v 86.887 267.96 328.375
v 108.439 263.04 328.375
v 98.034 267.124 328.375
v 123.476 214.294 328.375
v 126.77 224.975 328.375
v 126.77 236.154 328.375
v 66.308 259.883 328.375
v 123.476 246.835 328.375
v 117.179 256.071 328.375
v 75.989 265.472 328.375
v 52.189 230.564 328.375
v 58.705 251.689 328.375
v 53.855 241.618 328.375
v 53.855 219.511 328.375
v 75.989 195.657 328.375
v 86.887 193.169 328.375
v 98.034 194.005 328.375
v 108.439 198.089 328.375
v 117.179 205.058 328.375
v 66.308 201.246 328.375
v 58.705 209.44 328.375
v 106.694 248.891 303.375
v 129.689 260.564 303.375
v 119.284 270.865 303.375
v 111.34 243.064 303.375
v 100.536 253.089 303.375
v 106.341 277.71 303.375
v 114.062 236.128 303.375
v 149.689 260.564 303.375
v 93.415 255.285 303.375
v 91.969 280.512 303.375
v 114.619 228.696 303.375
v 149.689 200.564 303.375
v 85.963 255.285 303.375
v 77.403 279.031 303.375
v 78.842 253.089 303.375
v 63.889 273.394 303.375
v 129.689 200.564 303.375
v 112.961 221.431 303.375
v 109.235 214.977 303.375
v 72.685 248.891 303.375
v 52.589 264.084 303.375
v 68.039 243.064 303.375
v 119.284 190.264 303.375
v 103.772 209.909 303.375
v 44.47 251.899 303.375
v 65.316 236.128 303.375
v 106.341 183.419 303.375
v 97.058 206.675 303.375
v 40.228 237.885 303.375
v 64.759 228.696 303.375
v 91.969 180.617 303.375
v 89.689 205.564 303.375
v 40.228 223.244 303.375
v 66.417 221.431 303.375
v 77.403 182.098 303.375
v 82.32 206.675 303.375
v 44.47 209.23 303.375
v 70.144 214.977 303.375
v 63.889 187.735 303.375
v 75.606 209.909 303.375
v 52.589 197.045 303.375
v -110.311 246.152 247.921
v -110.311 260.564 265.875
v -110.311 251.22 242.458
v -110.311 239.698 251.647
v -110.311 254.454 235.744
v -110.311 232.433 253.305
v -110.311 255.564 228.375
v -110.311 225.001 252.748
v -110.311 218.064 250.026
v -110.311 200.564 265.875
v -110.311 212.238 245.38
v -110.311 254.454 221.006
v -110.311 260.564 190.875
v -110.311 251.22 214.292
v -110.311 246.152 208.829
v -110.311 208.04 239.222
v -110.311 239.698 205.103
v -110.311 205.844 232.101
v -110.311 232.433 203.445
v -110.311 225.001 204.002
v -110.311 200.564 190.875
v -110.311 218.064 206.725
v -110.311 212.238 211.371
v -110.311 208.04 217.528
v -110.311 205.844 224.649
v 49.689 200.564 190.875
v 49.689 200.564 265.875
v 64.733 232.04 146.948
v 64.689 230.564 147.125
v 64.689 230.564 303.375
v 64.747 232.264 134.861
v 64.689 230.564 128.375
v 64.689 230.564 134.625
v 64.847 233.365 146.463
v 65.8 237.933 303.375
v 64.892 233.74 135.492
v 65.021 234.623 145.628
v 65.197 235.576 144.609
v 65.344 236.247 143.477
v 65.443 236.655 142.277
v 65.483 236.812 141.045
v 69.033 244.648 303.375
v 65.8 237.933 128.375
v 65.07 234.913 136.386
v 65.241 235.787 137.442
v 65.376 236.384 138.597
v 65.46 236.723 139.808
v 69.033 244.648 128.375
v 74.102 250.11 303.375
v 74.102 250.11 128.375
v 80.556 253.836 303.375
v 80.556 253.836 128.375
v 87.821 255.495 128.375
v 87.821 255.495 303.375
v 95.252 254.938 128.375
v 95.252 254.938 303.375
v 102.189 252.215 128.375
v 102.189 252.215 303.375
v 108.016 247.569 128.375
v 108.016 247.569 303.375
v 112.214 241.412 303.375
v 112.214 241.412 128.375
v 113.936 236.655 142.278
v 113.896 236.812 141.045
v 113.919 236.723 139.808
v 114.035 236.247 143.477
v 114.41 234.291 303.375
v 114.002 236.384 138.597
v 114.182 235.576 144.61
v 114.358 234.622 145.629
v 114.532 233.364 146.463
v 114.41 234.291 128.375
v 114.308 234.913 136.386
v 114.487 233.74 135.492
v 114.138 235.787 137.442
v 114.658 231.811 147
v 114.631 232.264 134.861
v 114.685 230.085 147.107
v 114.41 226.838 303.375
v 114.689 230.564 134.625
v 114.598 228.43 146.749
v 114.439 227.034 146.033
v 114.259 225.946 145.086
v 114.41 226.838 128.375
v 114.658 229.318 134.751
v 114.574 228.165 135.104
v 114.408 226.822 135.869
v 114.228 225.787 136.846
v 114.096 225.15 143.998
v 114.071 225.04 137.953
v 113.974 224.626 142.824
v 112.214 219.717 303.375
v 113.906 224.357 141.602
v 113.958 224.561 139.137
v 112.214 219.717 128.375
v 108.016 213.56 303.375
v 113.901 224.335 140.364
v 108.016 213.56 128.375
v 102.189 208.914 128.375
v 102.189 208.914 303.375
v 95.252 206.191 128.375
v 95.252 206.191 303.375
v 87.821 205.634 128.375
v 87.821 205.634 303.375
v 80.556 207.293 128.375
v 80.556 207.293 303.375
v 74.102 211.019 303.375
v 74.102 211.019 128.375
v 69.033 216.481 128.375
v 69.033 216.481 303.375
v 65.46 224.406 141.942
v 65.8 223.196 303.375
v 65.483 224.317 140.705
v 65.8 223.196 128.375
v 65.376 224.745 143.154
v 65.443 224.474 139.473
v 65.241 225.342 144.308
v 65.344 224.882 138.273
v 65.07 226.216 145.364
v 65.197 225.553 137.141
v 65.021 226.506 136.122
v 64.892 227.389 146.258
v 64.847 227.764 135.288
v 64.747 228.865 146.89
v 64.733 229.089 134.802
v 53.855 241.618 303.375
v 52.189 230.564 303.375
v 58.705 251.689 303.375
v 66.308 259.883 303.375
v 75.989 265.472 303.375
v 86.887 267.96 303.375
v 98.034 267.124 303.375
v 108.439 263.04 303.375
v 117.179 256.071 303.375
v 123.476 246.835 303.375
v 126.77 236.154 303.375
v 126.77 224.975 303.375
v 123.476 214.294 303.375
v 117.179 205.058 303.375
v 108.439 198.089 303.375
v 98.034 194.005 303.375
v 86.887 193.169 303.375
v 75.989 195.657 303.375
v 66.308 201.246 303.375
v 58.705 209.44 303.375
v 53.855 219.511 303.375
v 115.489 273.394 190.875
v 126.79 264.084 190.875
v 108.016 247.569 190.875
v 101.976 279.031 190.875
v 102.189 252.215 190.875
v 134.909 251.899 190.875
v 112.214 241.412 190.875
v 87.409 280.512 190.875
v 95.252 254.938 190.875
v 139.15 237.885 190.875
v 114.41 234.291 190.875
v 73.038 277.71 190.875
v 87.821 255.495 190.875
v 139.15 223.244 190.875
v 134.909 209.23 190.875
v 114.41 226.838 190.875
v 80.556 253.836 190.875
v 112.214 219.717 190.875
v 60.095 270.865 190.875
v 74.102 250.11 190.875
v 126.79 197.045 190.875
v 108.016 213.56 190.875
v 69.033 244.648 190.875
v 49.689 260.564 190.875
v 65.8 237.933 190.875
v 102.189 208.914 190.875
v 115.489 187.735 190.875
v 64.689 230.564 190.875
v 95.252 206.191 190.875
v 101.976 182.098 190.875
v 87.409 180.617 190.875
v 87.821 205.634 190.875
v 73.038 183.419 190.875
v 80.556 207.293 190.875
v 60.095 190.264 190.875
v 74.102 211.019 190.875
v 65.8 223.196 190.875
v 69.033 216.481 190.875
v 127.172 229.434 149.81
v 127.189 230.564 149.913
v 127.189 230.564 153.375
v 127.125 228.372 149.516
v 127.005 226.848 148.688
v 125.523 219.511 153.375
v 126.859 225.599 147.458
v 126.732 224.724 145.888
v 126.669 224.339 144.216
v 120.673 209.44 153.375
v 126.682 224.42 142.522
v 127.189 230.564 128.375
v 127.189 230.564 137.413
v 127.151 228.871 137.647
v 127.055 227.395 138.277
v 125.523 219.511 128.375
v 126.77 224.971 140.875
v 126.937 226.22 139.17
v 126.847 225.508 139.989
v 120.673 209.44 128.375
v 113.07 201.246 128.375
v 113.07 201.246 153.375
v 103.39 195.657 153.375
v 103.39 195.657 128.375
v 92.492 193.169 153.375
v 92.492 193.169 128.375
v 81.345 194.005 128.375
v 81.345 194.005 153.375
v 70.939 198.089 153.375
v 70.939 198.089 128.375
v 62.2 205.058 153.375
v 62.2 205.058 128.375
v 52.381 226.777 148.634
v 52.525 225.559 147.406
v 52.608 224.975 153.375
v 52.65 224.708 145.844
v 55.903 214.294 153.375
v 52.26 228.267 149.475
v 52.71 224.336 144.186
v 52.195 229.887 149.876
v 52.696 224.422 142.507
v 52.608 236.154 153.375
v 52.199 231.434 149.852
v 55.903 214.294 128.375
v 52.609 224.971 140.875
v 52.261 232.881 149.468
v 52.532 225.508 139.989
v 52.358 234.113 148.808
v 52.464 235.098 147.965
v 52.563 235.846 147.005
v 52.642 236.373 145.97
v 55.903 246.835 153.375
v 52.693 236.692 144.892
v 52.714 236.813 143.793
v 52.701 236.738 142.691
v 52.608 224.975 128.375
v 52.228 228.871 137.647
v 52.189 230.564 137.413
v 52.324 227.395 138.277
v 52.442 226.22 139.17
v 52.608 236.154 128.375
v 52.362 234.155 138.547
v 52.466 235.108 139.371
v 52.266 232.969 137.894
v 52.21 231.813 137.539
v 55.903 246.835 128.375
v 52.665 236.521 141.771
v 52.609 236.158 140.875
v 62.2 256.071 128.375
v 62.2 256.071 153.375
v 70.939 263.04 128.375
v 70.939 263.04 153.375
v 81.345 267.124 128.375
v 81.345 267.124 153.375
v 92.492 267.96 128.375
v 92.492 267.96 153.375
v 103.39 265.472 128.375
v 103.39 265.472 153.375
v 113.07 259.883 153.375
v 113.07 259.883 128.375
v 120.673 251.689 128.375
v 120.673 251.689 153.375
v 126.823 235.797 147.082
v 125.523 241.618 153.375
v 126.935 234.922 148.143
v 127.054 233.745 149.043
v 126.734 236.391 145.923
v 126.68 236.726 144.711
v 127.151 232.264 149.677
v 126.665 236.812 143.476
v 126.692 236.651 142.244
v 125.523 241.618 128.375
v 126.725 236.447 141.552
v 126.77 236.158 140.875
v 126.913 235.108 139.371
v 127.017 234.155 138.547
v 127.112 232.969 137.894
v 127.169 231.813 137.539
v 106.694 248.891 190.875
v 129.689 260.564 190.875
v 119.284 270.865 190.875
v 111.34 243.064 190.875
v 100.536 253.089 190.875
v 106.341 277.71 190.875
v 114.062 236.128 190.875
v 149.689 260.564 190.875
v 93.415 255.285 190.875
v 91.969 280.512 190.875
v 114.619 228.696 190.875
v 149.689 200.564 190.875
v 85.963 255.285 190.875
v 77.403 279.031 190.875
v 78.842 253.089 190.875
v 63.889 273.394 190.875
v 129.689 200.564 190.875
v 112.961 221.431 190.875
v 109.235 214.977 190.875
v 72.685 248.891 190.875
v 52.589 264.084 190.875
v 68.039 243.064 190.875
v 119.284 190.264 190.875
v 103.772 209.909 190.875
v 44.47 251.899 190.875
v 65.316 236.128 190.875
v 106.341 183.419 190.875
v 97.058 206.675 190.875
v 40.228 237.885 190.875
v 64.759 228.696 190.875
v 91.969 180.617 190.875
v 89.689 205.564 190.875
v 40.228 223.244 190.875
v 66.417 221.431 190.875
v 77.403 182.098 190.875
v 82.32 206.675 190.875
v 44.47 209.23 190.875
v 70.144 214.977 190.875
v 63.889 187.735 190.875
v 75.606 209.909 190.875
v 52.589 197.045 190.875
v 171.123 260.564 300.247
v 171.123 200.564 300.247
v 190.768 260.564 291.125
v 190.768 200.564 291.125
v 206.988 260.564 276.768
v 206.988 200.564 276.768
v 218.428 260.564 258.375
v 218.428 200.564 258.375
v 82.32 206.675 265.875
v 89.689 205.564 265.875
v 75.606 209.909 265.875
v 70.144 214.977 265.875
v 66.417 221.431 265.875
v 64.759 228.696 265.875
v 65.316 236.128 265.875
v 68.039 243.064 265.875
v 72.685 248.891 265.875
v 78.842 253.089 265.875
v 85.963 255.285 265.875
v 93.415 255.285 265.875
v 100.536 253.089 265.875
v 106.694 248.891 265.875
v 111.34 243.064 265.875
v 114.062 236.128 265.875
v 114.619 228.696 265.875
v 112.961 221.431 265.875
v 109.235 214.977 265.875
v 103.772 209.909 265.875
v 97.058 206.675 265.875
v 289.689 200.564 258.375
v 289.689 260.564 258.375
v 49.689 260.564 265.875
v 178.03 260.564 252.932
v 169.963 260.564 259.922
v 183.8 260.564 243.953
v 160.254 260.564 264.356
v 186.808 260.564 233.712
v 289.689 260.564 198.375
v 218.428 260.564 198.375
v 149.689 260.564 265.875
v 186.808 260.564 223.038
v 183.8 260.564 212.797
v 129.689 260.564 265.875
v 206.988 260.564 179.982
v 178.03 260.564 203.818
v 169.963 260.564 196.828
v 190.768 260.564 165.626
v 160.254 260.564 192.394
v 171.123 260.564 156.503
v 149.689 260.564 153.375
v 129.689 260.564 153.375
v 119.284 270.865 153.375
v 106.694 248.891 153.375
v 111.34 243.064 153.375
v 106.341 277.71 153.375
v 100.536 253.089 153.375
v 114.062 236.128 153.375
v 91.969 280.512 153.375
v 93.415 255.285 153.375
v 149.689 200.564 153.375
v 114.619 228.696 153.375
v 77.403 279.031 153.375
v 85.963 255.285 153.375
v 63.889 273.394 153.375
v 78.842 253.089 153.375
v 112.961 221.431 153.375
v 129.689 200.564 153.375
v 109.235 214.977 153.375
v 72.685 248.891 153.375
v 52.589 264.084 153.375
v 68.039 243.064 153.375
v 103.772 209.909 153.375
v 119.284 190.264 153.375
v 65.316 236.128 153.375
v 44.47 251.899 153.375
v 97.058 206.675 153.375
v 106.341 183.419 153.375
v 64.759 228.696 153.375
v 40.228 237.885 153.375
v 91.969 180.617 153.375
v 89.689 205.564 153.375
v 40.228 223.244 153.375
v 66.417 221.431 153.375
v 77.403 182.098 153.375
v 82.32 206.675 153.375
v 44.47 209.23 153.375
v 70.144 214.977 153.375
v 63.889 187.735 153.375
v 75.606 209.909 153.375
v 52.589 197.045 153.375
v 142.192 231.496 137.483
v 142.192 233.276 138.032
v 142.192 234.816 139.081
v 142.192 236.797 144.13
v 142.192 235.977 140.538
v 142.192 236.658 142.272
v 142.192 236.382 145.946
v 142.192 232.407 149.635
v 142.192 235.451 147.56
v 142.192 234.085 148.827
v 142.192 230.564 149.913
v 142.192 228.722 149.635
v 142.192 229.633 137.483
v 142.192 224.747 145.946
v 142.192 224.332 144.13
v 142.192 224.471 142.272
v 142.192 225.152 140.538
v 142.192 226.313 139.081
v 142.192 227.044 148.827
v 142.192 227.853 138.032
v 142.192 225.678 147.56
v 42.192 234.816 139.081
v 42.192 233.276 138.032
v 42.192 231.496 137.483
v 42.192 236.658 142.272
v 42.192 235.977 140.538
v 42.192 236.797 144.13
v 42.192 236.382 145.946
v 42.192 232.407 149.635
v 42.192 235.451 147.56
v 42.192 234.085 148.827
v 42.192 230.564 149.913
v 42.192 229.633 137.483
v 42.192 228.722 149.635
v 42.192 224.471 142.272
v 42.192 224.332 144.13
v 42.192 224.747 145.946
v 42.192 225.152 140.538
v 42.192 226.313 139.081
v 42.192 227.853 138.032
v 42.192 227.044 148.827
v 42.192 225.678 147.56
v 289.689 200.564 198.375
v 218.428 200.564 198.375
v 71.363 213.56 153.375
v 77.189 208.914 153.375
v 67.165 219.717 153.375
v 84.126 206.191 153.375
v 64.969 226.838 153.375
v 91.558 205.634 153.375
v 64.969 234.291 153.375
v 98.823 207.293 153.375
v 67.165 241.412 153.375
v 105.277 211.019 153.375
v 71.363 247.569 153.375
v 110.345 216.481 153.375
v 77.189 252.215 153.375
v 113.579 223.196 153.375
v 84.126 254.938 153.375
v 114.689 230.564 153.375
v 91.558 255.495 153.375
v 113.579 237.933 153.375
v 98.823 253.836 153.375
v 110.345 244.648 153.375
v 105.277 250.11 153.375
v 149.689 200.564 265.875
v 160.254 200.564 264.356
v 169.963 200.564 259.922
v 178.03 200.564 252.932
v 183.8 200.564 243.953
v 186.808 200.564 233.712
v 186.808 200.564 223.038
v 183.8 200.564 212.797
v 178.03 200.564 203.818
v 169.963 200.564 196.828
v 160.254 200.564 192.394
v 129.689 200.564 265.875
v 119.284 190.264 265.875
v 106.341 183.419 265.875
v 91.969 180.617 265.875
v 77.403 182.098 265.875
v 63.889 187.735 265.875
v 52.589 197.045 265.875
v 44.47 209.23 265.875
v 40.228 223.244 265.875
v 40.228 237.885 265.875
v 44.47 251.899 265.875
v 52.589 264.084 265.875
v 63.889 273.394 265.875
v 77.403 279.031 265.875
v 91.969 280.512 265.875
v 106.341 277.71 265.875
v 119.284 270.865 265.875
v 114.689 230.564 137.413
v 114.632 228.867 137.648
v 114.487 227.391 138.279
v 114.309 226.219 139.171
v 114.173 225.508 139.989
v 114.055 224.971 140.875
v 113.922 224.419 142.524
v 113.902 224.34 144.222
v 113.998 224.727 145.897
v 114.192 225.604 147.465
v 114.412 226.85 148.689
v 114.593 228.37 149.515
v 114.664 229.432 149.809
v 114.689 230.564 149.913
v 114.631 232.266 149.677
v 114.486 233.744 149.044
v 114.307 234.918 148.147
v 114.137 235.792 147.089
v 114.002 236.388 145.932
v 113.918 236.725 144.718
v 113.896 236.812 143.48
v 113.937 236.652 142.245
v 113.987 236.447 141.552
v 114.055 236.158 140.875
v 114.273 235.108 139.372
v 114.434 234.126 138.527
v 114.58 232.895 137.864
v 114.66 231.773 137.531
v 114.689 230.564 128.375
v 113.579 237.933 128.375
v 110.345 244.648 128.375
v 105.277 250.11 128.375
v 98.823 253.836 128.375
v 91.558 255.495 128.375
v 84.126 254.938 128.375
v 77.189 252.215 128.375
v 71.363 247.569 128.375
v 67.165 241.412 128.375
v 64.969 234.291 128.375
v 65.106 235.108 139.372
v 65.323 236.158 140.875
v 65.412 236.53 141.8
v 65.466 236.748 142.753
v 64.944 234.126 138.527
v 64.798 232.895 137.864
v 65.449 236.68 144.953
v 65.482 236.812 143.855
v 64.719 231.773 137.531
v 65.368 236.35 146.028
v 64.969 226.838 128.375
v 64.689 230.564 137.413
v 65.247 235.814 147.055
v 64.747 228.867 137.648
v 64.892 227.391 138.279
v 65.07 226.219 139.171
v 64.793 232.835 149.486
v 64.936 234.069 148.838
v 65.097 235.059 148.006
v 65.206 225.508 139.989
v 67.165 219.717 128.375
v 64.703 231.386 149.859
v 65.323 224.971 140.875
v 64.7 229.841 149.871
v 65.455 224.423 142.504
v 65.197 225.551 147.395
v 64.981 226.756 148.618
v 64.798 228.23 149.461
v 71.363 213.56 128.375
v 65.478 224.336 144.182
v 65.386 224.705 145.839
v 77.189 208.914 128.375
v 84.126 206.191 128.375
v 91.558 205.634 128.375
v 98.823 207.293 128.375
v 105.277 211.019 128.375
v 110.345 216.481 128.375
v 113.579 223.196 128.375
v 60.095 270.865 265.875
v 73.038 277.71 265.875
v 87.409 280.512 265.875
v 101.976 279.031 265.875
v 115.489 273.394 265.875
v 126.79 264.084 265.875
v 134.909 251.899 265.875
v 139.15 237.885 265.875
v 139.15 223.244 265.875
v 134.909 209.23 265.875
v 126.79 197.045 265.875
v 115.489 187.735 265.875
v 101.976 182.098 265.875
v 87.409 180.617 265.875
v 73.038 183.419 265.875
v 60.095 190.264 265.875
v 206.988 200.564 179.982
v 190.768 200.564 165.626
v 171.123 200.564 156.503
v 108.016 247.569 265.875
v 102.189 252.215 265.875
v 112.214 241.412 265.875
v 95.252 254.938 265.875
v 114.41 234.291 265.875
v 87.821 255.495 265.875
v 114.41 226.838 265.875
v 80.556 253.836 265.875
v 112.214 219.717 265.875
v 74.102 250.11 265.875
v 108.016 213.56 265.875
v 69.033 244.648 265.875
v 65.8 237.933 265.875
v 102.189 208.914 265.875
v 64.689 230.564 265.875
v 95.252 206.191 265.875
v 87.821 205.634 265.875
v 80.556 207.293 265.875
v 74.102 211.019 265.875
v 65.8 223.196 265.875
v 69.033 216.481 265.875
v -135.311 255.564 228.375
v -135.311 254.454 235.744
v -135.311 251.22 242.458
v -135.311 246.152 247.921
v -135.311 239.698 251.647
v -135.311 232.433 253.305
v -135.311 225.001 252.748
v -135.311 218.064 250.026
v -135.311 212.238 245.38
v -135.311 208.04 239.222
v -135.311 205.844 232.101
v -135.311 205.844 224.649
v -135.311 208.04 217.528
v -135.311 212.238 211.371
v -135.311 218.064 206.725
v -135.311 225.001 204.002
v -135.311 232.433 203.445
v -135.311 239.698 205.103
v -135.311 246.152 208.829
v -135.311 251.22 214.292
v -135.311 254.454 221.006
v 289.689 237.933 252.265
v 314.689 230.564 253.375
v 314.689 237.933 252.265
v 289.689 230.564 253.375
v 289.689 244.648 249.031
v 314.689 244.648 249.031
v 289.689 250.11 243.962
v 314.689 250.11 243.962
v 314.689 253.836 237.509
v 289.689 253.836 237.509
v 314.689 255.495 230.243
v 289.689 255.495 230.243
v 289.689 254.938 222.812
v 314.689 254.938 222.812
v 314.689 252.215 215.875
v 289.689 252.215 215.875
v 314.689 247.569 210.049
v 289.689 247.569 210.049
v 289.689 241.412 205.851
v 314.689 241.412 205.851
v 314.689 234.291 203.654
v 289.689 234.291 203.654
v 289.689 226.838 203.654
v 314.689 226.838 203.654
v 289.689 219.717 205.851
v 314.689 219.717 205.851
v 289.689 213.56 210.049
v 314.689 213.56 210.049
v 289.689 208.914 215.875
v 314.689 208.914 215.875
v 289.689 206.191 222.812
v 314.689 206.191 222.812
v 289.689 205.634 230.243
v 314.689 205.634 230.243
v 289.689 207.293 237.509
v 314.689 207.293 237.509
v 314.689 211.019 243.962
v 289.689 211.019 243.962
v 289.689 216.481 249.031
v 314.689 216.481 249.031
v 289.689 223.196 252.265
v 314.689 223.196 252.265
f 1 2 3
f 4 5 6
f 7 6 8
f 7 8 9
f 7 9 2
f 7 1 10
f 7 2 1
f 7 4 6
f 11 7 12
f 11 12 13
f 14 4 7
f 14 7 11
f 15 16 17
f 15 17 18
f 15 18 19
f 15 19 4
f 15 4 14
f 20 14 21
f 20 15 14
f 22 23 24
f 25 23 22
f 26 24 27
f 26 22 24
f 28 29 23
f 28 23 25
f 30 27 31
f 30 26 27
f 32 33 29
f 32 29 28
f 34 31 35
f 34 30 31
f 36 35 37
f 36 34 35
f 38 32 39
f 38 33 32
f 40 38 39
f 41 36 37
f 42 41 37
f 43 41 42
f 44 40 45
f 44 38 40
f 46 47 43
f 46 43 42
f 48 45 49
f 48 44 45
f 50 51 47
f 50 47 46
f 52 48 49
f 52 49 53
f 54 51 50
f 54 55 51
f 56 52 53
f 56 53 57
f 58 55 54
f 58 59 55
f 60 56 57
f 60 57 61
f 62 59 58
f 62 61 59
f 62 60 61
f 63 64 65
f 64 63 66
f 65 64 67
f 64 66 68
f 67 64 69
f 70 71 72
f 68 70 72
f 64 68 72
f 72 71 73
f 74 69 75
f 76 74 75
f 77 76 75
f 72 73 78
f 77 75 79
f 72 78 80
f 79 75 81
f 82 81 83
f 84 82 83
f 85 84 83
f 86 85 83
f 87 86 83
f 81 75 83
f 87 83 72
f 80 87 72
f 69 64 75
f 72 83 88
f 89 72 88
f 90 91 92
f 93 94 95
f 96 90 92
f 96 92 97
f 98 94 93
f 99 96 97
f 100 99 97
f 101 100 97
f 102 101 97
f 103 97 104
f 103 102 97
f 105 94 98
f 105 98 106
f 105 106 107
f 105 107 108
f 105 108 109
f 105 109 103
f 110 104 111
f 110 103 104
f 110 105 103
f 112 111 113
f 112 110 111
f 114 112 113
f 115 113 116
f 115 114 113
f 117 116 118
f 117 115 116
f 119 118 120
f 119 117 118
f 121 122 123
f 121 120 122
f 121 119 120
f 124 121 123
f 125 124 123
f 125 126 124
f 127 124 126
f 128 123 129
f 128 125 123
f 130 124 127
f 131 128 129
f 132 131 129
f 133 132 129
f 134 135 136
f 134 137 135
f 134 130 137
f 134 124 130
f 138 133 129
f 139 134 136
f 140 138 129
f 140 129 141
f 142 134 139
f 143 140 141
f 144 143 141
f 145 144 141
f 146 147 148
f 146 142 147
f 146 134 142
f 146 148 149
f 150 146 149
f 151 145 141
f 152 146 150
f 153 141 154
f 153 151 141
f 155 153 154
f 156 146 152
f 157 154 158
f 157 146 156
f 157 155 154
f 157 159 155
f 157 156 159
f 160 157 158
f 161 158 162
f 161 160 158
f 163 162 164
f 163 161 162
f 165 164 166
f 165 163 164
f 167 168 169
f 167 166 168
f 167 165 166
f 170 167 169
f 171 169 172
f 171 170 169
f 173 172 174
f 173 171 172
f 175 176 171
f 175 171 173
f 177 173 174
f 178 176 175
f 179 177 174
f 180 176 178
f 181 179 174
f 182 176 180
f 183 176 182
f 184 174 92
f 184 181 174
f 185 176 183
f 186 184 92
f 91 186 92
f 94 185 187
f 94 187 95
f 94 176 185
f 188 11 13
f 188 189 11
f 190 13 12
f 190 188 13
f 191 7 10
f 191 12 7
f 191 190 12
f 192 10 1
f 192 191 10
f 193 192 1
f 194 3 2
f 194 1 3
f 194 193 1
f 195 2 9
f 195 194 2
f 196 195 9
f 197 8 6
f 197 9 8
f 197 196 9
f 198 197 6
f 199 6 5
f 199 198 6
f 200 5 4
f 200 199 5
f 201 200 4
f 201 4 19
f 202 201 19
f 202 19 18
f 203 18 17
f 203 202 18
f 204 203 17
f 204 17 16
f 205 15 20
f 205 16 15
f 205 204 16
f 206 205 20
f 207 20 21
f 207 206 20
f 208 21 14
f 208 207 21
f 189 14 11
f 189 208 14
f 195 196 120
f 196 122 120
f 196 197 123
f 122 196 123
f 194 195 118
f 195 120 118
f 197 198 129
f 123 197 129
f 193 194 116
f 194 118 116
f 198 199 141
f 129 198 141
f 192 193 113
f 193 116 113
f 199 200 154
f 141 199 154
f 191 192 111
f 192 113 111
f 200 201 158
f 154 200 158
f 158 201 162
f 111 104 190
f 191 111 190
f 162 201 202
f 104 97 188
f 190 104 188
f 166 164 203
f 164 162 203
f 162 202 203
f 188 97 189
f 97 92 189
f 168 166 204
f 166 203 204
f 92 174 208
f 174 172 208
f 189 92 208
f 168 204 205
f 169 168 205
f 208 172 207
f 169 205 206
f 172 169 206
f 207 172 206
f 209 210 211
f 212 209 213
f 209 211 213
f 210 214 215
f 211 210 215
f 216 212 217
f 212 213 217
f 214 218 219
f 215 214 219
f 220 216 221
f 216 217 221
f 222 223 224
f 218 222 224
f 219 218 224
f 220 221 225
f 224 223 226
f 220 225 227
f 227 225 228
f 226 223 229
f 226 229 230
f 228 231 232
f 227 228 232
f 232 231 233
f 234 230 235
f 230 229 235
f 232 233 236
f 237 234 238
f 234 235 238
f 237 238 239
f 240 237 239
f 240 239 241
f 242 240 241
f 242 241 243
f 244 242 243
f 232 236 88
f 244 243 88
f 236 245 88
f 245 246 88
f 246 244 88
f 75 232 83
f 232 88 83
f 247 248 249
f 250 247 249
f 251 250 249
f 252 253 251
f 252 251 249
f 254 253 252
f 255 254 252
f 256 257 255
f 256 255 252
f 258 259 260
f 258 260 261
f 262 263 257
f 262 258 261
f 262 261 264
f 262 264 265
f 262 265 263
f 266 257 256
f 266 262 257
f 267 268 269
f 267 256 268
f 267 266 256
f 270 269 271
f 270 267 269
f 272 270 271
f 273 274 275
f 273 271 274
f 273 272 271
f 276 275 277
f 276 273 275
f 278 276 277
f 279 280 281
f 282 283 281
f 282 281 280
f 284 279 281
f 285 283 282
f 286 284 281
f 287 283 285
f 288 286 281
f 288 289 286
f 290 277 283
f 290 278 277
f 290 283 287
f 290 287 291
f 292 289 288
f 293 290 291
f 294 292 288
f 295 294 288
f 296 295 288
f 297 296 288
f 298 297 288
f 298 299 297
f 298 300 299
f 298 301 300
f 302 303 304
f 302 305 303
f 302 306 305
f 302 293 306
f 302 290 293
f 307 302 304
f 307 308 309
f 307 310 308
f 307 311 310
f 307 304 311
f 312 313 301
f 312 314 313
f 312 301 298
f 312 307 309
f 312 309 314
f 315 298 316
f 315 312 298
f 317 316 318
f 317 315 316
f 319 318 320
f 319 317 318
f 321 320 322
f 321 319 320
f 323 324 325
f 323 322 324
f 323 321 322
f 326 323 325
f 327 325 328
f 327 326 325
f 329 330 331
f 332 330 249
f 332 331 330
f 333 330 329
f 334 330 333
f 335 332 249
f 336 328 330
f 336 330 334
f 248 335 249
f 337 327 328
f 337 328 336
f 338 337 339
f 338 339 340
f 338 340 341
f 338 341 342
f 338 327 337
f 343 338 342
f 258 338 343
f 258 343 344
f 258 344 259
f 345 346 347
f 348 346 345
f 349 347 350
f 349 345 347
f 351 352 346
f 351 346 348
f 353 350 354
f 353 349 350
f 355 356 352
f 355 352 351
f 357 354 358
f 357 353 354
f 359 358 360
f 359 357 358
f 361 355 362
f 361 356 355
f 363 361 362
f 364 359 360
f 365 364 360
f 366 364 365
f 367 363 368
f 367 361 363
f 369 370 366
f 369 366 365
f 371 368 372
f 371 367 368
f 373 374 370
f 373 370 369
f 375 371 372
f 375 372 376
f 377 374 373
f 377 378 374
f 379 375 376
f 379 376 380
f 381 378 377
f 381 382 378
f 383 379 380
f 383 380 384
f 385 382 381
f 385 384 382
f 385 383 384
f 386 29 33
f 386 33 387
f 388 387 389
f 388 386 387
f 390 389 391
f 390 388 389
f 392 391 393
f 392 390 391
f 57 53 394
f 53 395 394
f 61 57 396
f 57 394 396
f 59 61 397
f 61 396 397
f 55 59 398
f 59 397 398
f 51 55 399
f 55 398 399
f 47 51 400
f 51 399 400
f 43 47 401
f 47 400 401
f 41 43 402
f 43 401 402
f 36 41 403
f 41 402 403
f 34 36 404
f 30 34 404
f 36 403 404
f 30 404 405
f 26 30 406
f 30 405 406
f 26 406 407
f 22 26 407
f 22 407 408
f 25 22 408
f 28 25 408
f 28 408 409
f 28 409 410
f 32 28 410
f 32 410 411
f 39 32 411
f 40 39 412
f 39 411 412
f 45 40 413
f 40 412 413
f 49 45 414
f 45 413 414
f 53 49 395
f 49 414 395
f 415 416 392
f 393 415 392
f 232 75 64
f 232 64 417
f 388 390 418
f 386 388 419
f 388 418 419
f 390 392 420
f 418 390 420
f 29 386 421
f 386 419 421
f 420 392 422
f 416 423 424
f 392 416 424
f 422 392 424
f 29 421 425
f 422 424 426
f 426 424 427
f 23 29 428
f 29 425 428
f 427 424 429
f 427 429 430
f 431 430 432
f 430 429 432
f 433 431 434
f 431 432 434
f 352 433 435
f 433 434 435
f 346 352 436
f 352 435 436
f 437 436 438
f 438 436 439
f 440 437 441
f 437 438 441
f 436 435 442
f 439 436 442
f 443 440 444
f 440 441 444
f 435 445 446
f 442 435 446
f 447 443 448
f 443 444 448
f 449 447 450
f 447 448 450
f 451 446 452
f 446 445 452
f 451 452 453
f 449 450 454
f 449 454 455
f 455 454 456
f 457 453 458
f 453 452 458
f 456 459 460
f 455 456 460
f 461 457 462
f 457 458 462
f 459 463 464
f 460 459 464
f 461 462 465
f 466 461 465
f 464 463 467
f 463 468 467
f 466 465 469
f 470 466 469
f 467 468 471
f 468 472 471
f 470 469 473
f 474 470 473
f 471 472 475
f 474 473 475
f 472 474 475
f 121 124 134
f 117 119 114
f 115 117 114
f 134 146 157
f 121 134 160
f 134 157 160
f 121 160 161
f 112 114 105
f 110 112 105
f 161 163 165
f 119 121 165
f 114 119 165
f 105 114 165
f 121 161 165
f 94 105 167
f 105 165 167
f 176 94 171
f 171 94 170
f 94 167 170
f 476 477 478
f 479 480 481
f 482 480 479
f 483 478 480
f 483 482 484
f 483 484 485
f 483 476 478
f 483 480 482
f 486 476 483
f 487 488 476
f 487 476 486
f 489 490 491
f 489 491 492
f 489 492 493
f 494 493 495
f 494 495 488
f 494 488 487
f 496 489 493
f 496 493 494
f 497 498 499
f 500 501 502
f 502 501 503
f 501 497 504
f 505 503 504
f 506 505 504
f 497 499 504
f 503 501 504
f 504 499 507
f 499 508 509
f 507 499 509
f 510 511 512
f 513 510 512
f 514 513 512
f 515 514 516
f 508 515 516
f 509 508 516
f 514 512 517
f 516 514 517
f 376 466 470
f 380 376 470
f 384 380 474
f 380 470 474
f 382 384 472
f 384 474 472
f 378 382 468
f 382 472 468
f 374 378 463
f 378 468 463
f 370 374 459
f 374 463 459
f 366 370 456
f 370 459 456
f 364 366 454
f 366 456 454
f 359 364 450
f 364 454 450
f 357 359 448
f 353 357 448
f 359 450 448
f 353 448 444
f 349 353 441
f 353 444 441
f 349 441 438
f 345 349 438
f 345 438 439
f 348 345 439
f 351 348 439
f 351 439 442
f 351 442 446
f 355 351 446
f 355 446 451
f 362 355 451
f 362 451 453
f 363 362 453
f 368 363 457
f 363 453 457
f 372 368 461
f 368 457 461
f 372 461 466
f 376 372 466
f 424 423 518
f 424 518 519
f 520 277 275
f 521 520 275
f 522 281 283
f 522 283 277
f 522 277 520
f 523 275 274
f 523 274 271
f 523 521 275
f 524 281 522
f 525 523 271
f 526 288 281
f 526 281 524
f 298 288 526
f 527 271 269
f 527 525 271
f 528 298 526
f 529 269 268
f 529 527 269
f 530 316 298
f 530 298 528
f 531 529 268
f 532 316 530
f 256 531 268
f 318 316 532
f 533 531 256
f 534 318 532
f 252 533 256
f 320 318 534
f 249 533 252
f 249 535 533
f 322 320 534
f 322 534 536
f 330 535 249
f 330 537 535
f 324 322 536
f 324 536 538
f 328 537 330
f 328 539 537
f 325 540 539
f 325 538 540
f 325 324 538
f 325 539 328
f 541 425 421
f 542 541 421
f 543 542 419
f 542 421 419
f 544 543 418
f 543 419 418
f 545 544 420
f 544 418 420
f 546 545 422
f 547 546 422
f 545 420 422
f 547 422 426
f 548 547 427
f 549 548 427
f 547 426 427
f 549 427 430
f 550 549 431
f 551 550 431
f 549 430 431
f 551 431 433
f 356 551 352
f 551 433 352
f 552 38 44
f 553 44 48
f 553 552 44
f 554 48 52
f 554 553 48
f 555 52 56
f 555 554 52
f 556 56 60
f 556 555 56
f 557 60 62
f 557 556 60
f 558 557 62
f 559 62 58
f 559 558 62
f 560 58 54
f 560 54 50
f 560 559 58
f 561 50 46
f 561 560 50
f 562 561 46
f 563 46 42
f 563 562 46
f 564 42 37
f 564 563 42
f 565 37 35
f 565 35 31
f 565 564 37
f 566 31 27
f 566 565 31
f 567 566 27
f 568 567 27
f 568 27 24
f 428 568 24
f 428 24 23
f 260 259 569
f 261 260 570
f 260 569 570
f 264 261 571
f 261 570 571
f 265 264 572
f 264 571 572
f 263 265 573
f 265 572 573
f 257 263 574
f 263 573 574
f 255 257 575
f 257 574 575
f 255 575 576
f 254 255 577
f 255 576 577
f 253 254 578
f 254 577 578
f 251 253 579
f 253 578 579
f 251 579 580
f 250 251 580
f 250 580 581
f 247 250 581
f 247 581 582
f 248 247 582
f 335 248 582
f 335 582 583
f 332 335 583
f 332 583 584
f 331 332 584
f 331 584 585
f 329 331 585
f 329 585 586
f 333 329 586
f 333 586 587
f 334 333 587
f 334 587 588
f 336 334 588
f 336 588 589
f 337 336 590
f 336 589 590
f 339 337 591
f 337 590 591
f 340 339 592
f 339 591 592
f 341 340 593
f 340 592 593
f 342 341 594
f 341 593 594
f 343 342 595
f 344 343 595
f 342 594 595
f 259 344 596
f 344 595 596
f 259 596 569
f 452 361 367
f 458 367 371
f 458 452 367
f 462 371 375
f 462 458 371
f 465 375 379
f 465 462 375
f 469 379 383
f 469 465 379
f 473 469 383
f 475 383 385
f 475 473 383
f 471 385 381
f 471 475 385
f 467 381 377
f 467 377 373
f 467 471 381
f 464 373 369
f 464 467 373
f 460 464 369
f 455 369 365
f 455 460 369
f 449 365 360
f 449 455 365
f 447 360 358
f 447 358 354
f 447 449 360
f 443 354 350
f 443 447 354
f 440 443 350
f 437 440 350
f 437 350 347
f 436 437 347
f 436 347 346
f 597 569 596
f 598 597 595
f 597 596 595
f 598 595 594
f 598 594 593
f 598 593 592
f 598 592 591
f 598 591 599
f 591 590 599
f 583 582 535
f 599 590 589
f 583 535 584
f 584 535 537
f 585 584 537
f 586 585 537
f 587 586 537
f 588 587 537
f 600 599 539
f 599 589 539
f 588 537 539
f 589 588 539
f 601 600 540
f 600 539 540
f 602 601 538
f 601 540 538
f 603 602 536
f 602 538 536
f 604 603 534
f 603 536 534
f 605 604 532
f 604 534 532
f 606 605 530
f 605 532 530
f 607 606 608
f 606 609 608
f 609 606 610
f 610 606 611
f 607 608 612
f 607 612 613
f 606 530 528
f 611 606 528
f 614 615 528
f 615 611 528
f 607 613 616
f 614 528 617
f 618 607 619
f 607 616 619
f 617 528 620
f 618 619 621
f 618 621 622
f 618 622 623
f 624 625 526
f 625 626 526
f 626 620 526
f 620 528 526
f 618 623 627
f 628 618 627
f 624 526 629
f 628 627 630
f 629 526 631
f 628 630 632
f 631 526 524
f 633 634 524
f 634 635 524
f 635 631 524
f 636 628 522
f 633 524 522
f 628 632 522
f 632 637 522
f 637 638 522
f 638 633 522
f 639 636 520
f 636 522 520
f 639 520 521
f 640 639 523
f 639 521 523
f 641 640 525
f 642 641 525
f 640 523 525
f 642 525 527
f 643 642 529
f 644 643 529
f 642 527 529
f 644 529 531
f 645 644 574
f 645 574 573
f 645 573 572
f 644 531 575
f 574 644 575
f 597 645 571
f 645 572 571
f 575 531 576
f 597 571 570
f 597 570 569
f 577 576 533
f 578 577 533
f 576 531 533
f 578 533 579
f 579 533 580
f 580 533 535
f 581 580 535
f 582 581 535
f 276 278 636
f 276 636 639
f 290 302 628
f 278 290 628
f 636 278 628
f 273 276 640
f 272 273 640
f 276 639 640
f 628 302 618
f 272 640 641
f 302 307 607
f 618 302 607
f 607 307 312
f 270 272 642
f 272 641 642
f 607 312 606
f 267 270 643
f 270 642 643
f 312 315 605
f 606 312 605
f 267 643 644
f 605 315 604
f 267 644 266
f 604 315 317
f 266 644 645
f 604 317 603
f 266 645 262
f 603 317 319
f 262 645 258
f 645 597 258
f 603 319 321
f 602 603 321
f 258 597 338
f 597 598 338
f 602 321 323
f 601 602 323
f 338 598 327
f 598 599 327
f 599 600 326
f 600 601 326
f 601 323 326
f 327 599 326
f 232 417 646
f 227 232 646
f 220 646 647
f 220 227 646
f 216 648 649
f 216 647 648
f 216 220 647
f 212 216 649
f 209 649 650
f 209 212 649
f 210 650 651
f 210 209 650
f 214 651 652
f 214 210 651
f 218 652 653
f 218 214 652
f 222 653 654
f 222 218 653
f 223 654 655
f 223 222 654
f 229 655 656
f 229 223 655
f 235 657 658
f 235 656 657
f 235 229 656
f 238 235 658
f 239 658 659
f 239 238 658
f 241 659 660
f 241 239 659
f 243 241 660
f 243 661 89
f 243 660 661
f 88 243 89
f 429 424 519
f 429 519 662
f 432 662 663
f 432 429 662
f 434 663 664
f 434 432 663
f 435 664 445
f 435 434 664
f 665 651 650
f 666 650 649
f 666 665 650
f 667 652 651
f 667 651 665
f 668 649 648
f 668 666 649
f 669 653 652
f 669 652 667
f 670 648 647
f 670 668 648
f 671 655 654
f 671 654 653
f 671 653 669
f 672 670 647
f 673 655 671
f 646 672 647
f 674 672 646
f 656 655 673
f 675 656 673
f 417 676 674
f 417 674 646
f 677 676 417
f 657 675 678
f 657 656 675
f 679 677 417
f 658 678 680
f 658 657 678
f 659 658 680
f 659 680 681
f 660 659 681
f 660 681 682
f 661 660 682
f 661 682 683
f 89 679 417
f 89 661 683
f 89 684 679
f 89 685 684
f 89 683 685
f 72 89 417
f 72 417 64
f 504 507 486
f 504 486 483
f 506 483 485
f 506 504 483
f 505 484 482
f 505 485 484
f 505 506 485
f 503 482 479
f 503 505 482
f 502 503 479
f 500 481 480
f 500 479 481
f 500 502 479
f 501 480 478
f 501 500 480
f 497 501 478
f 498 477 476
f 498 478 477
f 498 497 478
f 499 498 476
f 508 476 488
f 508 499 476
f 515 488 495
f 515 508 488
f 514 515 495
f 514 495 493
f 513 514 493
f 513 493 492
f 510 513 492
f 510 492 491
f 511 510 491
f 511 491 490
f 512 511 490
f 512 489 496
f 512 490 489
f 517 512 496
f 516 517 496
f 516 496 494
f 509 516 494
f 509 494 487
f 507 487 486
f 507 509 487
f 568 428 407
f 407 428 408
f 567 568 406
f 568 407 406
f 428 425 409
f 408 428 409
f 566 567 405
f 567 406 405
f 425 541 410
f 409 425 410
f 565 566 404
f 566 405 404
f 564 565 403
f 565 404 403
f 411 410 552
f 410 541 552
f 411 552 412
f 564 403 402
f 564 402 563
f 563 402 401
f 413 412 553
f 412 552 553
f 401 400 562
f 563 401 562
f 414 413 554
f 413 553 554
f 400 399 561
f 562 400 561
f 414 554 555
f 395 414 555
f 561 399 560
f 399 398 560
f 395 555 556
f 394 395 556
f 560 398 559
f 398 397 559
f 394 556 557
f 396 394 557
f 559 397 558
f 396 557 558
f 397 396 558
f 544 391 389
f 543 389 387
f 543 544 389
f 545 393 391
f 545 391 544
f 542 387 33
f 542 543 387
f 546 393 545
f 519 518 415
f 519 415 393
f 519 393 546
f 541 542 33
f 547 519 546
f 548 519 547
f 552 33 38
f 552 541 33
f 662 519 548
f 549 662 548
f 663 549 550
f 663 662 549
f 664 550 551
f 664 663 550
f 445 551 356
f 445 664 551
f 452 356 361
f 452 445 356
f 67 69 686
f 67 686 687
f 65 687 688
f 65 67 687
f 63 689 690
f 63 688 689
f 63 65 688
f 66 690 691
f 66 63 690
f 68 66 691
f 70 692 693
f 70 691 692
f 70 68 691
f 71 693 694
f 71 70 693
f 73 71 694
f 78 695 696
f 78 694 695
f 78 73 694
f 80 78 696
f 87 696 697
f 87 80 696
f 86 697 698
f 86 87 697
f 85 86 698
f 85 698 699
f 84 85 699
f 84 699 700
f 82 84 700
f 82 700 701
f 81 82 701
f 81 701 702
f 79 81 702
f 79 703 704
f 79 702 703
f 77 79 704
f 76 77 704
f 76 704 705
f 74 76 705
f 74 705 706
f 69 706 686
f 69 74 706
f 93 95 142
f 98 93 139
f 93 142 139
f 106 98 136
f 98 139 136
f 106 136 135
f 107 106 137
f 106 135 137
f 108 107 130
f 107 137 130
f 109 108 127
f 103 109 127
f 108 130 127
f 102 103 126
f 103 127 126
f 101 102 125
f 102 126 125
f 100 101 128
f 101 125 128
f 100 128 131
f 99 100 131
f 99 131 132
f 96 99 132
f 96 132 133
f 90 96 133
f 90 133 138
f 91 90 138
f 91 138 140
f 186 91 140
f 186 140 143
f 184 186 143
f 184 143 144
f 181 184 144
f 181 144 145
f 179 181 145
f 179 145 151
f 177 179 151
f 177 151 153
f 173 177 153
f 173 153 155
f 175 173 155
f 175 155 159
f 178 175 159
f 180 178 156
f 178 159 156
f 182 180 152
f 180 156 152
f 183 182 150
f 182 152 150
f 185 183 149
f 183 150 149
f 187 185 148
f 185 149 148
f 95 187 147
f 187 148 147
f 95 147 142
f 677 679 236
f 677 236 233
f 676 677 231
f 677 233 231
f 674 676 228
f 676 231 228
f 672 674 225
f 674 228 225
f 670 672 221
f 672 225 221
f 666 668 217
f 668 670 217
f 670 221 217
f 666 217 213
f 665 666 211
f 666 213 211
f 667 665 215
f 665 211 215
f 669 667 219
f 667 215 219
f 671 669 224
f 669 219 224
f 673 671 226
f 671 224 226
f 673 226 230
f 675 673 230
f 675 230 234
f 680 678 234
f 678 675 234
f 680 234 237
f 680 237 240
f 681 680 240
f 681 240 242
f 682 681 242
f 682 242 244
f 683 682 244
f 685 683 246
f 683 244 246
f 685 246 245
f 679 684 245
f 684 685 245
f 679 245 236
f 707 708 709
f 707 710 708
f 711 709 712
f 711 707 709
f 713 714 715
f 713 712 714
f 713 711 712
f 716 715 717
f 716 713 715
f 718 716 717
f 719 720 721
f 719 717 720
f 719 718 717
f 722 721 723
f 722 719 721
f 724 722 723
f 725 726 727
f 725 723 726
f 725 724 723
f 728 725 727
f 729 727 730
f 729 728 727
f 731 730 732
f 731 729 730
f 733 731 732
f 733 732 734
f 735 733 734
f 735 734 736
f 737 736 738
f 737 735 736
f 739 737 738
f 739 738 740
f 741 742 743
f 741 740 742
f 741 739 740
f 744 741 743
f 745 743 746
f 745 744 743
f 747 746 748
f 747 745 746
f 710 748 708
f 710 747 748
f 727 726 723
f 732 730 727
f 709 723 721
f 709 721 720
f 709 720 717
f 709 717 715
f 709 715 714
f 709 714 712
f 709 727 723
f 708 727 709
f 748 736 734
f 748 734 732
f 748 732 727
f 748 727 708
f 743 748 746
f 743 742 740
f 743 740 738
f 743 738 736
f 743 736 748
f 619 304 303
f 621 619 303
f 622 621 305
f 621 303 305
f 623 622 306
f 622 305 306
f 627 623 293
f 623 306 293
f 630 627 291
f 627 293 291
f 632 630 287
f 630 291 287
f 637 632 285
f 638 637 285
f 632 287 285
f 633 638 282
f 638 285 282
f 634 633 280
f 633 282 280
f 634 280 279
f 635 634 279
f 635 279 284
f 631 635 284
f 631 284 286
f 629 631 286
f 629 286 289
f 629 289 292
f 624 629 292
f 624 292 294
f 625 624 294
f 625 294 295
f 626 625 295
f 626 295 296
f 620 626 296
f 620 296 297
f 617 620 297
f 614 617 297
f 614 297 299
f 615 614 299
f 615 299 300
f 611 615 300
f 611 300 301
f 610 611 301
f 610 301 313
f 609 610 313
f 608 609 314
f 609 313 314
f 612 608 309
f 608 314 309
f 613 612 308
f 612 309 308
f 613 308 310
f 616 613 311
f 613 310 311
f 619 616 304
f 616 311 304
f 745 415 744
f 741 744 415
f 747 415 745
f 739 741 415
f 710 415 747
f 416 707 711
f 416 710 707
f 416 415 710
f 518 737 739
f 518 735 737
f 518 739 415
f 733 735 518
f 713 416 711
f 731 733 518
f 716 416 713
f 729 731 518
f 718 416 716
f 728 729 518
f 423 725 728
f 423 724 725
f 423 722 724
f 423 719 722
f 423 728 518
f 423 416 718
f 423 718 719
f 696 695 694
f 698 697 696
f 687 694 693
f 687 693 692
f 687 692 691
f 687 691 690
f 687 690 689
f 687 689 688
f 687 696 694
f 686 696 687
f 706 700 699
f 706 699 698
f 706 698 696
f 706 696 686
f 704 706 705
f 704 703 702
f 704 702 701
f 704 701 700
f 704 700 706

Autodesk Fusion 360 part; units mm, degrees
sketch "Sketch1" plane through (0, 0, 0) normal (0, 1, 0) x (1, 0, 0)
  circle A0 centre (0, 0) radius 50
  line L0 (200, 0) -> (200, -30)
  line L1 (200, -30) -> (40, -30)
  line L2 (200, 0) -> (200, 30)
  line L3 (200, 30) -> (40, 30)
  line L4 (225, 0) -> (225, 25)
  line L5 (225, 25) -> (200, 25)
  line L6 (225, 0) -> (225, -25)
  line L7 (225, -25) -> (200, -25)
  circle A1 centre (0, 0) radius 25
  line L8 (200, 0) -> (225, 0)
  dimension "d6" = 100
  dimension "d7" = 200
  dimension "d8" = 30
  dimension "d9" = 25
  dimension "d10" = 25
  dimension "d11" = 25
  dimension "d12" = 50
sketch "Sketch3" plane through (0, 0, 0) normal (0, 1, 0) x (1, 0, 0)
  line L0 (0, 0) -> (-25, 0)
  line L1 (0, 0) -> (-50, 0)
  line L2 (0, 0) -> (0, -175)
  line L3 (0, -175) -> (-60, -175)
  line L4 (-60, -175) -> (-60, -137.5)
  line L5 (-60, -137.5) -> (0, -137.5)
  line L6 (0, -137.5) -> (-37.5, -137.5)
  line L7 (0, 0) -> (0, -100)
  line L8 (0, -100) -> (-135, -100)
  line L9 (-60, -175) -> (-60, -100)
  arc A0 (-135, -100) -> (-60, -175) centre (-60, -100) ccw
  arc A1 (-97.5, -100) -> (-60, -137.5) centre (-60, -100) ccw
  arc A2 (-60, -62.5) -> (-97.5, -100) centre (-60, -100) ccw
  arc A3 (-60, -25) -> (-135, -100) centre (-60, -100) ccw
  line L10 (-60, -62.5) -> (0, -62.5)
  line L11 (0, -25) -> (-60, -25)
  line L12 (0, -100) -> (-200, -100)
  line L13 (-200, -100) -> (-200, -130)
  line L14 (-200, -130) -> (-128.7386, -130)
  line L15 (-200, -70) -> (-128.7386, -70)
  line L16 (-200, -100) -> (-200, -70)
  line L17 (-200, -100) -> (-225, -100)
  line L18 (-225, -100) -> (-225, -125)
  line L19 (-225, -125) -> (-200, -125)
  dimension "d18" = 25
  dimension "d19" = 50
  dimension "d21" = 175
  dimension "d22" = 60
  dimension "d23" = 37.5
  dimension "d24" = 37.5
  dimension "d25" = 100
  dimension "d28" = 200
  dimension "d29" = 25
  dimension "d30" = 25
extrude "Extrude2" add sketch "Sketch3" along normal mid plane 60 contours L2 L7 L8 A2 A3 L10 L11 L12 | A3 L12 L15 L16 | L2 L3 L4 L5 L6 L9 | L4 L8 L9 A0 A1 L12 | A0 L12 L13 L14 makes body 1
revolve "Revolve2" add sketch "Sketch3" angle 360 about axis through (0, 0, 100) along (-1, 0, 0) contours L13 L17 L18 L19 bodies 1
ref_plane "WorkPlane1" through (0, 0, 25) normal (0, 0, 1) x (1, 0, 0)
sketch "Sketch4" plane through (0, 0, 25) normal (0, 0, 1) x (1, 0, 0)
  circle A0 centre (0, 0) radius 25
  circle A1 centre (0, 0) radius 50
  dimension "d35" = 50
  dimension "d36" = 100
extrude "Extrude3" add sketch "Sketch4" along normal blind 37.5 bodies 1
extrude "Extrude4" cut sketch "Sketch4" along normal blind 37.5 contours A0 bodies 1
ref_plane "WorkPlane3" through (-5, 0, 137.5) normal (0, 0, 1) x (1, 0, 0)
sketch "Sketch5" plane through (-5, 0, 137.5) normal (0, 0, 1) x (1, 0, 0)
  circle A0 centre (5, 0) radius 25
  circle A1 centre (5, 0) radius 50
  dimension "d43" = 50
  dimension "d44" = 100
extrude "Extrude5" add sketch "Sketch5" along normal blind 37.5 bodies 1
extrude "Extrude6" cut sketch "Sketch5" along normal blind 37.5 contours A0 bodies 1
copy_body "Body->Comp2" bodies 1 removing the originals makes body 2 in component "Fork"
sketch "Sketch7" plane through (0, 0, 0) normal (0, 0, 1) x (1, 0, 0)
  circle A0 centre (0, 0) radius 25
  circle A1 centre (0, 0) radius 37.5
  dimension "d49" = 50
  dimension "d50" = 75
extrude "Extrude7" add sketch "Sketch7" along normal mid plane 25 separate body makes body 3
copy_body "Body->Comp3" bodies 3 removing the originals makes body 4 in component "Collar"
hole "Hole1" at (37.5, 0, 2.7878) direction (-1, 0, 0) diameter 12.5 depth 80 tip angle 118 bodies 4 in component "Collar"
sketch "Sketch8" plane through (0, 0, 0) normal (0, 1, 0) x (1, 0, 0)
  line L0 (0, 0) -> (0, -6.25)
  line L1 (0, -6.25) -> (50, -6.25)
  line L2 (50, -6.25) -> (50, 0)
  line L3 (50, 0) -> (0, 0)
  line L4 (0, -6.25) -> (-50, -6.25)
  line L5 (-50, 0) -> (0, 0)
  line L6 (-50, -6.25) -> (-50, 0)
  dimension "d56" = 6.25
  dimension "d57" = 50
revolve "Revolve3" add sketch "Sketch8" angle 360 about axis through (50, 0, 0) along (-1, 0, 0) separate body makes body 5
copy_body "Body->Comp4" bodies 5 removing the originals makes body 6 in component "Pin"
sketch "Sketch9" plane through (0, 0, 0) normal (0, 1, 0) x (1, 0, 0)
  line L0 (0, 0) -> (0, -200)
  line L1 (0, -200) -> (37.5, -200)
  line L2 (37.5, -200) -> (37.5, -175)
  line L3 (37.5, -175) -> (25, -175)
  line L4 (25, -175) -> (25, 0)
  line L5 (25, 0) -> (0, 0)
  dimension "d59" = 200
  dimension "d60" = 37.5
  dimension "d61" = 25
revolve "Revolve4" add sketch "Sketch9" angle 360 about axis through (0, 0, 0) along (0, 0, 1) separate body makes body 7
copy_body "Body->Comp5" bodies 7 removing the originals makes body 8 in component "TaperPin"
hole "Hole1'" at (25, 0, 12.5) direction (-1, 0, 0) diameter 12.5 depth 80 tip angle 118 bodies 8 in component "TaperPin"
extrude "Extrude8" add sketch "Sketch1" along normal mid plane 75 separate body contours A0 | A0 L0 L1 L2 L3 makes body 9
revolve "Revolve5" add sketch "Sketch1" angle 360 about axis through (1.75, 0, 0) along (1, 0, 0) contours L0 L6 L7 L8 bodies 9
copy_body "Body->Comp6" bodies 9 removing the originals makes body 10 in component "Eye"
component "Fork" placed x (-1, 0, 0) y (0, -1, 0) z (0, 0, 1) at (89.6893, 230.5645, 128.3752)
component "Collar" placed x (1, 0, 0) y (0, 1, 0) z (0, 0, 1) at (89.6893, 230.5645, 140.8752)
component "Pin" placed x (-1, 0, 0) y (0, -1, 0) z (0, 0, 1) at (92.1921, 230.5645, 143.663)
component "TaperPin" placed x (-1, 0, 0) y (0, -1, 0) z (0, 0, 1) at (89.6893, 230.5645, 128.3752)
component "Eye" placed x (-1, 0, 0) y (0, 0, 1) z (0, 1, 0) at (89.6893, 230.5645, 228.3752)
